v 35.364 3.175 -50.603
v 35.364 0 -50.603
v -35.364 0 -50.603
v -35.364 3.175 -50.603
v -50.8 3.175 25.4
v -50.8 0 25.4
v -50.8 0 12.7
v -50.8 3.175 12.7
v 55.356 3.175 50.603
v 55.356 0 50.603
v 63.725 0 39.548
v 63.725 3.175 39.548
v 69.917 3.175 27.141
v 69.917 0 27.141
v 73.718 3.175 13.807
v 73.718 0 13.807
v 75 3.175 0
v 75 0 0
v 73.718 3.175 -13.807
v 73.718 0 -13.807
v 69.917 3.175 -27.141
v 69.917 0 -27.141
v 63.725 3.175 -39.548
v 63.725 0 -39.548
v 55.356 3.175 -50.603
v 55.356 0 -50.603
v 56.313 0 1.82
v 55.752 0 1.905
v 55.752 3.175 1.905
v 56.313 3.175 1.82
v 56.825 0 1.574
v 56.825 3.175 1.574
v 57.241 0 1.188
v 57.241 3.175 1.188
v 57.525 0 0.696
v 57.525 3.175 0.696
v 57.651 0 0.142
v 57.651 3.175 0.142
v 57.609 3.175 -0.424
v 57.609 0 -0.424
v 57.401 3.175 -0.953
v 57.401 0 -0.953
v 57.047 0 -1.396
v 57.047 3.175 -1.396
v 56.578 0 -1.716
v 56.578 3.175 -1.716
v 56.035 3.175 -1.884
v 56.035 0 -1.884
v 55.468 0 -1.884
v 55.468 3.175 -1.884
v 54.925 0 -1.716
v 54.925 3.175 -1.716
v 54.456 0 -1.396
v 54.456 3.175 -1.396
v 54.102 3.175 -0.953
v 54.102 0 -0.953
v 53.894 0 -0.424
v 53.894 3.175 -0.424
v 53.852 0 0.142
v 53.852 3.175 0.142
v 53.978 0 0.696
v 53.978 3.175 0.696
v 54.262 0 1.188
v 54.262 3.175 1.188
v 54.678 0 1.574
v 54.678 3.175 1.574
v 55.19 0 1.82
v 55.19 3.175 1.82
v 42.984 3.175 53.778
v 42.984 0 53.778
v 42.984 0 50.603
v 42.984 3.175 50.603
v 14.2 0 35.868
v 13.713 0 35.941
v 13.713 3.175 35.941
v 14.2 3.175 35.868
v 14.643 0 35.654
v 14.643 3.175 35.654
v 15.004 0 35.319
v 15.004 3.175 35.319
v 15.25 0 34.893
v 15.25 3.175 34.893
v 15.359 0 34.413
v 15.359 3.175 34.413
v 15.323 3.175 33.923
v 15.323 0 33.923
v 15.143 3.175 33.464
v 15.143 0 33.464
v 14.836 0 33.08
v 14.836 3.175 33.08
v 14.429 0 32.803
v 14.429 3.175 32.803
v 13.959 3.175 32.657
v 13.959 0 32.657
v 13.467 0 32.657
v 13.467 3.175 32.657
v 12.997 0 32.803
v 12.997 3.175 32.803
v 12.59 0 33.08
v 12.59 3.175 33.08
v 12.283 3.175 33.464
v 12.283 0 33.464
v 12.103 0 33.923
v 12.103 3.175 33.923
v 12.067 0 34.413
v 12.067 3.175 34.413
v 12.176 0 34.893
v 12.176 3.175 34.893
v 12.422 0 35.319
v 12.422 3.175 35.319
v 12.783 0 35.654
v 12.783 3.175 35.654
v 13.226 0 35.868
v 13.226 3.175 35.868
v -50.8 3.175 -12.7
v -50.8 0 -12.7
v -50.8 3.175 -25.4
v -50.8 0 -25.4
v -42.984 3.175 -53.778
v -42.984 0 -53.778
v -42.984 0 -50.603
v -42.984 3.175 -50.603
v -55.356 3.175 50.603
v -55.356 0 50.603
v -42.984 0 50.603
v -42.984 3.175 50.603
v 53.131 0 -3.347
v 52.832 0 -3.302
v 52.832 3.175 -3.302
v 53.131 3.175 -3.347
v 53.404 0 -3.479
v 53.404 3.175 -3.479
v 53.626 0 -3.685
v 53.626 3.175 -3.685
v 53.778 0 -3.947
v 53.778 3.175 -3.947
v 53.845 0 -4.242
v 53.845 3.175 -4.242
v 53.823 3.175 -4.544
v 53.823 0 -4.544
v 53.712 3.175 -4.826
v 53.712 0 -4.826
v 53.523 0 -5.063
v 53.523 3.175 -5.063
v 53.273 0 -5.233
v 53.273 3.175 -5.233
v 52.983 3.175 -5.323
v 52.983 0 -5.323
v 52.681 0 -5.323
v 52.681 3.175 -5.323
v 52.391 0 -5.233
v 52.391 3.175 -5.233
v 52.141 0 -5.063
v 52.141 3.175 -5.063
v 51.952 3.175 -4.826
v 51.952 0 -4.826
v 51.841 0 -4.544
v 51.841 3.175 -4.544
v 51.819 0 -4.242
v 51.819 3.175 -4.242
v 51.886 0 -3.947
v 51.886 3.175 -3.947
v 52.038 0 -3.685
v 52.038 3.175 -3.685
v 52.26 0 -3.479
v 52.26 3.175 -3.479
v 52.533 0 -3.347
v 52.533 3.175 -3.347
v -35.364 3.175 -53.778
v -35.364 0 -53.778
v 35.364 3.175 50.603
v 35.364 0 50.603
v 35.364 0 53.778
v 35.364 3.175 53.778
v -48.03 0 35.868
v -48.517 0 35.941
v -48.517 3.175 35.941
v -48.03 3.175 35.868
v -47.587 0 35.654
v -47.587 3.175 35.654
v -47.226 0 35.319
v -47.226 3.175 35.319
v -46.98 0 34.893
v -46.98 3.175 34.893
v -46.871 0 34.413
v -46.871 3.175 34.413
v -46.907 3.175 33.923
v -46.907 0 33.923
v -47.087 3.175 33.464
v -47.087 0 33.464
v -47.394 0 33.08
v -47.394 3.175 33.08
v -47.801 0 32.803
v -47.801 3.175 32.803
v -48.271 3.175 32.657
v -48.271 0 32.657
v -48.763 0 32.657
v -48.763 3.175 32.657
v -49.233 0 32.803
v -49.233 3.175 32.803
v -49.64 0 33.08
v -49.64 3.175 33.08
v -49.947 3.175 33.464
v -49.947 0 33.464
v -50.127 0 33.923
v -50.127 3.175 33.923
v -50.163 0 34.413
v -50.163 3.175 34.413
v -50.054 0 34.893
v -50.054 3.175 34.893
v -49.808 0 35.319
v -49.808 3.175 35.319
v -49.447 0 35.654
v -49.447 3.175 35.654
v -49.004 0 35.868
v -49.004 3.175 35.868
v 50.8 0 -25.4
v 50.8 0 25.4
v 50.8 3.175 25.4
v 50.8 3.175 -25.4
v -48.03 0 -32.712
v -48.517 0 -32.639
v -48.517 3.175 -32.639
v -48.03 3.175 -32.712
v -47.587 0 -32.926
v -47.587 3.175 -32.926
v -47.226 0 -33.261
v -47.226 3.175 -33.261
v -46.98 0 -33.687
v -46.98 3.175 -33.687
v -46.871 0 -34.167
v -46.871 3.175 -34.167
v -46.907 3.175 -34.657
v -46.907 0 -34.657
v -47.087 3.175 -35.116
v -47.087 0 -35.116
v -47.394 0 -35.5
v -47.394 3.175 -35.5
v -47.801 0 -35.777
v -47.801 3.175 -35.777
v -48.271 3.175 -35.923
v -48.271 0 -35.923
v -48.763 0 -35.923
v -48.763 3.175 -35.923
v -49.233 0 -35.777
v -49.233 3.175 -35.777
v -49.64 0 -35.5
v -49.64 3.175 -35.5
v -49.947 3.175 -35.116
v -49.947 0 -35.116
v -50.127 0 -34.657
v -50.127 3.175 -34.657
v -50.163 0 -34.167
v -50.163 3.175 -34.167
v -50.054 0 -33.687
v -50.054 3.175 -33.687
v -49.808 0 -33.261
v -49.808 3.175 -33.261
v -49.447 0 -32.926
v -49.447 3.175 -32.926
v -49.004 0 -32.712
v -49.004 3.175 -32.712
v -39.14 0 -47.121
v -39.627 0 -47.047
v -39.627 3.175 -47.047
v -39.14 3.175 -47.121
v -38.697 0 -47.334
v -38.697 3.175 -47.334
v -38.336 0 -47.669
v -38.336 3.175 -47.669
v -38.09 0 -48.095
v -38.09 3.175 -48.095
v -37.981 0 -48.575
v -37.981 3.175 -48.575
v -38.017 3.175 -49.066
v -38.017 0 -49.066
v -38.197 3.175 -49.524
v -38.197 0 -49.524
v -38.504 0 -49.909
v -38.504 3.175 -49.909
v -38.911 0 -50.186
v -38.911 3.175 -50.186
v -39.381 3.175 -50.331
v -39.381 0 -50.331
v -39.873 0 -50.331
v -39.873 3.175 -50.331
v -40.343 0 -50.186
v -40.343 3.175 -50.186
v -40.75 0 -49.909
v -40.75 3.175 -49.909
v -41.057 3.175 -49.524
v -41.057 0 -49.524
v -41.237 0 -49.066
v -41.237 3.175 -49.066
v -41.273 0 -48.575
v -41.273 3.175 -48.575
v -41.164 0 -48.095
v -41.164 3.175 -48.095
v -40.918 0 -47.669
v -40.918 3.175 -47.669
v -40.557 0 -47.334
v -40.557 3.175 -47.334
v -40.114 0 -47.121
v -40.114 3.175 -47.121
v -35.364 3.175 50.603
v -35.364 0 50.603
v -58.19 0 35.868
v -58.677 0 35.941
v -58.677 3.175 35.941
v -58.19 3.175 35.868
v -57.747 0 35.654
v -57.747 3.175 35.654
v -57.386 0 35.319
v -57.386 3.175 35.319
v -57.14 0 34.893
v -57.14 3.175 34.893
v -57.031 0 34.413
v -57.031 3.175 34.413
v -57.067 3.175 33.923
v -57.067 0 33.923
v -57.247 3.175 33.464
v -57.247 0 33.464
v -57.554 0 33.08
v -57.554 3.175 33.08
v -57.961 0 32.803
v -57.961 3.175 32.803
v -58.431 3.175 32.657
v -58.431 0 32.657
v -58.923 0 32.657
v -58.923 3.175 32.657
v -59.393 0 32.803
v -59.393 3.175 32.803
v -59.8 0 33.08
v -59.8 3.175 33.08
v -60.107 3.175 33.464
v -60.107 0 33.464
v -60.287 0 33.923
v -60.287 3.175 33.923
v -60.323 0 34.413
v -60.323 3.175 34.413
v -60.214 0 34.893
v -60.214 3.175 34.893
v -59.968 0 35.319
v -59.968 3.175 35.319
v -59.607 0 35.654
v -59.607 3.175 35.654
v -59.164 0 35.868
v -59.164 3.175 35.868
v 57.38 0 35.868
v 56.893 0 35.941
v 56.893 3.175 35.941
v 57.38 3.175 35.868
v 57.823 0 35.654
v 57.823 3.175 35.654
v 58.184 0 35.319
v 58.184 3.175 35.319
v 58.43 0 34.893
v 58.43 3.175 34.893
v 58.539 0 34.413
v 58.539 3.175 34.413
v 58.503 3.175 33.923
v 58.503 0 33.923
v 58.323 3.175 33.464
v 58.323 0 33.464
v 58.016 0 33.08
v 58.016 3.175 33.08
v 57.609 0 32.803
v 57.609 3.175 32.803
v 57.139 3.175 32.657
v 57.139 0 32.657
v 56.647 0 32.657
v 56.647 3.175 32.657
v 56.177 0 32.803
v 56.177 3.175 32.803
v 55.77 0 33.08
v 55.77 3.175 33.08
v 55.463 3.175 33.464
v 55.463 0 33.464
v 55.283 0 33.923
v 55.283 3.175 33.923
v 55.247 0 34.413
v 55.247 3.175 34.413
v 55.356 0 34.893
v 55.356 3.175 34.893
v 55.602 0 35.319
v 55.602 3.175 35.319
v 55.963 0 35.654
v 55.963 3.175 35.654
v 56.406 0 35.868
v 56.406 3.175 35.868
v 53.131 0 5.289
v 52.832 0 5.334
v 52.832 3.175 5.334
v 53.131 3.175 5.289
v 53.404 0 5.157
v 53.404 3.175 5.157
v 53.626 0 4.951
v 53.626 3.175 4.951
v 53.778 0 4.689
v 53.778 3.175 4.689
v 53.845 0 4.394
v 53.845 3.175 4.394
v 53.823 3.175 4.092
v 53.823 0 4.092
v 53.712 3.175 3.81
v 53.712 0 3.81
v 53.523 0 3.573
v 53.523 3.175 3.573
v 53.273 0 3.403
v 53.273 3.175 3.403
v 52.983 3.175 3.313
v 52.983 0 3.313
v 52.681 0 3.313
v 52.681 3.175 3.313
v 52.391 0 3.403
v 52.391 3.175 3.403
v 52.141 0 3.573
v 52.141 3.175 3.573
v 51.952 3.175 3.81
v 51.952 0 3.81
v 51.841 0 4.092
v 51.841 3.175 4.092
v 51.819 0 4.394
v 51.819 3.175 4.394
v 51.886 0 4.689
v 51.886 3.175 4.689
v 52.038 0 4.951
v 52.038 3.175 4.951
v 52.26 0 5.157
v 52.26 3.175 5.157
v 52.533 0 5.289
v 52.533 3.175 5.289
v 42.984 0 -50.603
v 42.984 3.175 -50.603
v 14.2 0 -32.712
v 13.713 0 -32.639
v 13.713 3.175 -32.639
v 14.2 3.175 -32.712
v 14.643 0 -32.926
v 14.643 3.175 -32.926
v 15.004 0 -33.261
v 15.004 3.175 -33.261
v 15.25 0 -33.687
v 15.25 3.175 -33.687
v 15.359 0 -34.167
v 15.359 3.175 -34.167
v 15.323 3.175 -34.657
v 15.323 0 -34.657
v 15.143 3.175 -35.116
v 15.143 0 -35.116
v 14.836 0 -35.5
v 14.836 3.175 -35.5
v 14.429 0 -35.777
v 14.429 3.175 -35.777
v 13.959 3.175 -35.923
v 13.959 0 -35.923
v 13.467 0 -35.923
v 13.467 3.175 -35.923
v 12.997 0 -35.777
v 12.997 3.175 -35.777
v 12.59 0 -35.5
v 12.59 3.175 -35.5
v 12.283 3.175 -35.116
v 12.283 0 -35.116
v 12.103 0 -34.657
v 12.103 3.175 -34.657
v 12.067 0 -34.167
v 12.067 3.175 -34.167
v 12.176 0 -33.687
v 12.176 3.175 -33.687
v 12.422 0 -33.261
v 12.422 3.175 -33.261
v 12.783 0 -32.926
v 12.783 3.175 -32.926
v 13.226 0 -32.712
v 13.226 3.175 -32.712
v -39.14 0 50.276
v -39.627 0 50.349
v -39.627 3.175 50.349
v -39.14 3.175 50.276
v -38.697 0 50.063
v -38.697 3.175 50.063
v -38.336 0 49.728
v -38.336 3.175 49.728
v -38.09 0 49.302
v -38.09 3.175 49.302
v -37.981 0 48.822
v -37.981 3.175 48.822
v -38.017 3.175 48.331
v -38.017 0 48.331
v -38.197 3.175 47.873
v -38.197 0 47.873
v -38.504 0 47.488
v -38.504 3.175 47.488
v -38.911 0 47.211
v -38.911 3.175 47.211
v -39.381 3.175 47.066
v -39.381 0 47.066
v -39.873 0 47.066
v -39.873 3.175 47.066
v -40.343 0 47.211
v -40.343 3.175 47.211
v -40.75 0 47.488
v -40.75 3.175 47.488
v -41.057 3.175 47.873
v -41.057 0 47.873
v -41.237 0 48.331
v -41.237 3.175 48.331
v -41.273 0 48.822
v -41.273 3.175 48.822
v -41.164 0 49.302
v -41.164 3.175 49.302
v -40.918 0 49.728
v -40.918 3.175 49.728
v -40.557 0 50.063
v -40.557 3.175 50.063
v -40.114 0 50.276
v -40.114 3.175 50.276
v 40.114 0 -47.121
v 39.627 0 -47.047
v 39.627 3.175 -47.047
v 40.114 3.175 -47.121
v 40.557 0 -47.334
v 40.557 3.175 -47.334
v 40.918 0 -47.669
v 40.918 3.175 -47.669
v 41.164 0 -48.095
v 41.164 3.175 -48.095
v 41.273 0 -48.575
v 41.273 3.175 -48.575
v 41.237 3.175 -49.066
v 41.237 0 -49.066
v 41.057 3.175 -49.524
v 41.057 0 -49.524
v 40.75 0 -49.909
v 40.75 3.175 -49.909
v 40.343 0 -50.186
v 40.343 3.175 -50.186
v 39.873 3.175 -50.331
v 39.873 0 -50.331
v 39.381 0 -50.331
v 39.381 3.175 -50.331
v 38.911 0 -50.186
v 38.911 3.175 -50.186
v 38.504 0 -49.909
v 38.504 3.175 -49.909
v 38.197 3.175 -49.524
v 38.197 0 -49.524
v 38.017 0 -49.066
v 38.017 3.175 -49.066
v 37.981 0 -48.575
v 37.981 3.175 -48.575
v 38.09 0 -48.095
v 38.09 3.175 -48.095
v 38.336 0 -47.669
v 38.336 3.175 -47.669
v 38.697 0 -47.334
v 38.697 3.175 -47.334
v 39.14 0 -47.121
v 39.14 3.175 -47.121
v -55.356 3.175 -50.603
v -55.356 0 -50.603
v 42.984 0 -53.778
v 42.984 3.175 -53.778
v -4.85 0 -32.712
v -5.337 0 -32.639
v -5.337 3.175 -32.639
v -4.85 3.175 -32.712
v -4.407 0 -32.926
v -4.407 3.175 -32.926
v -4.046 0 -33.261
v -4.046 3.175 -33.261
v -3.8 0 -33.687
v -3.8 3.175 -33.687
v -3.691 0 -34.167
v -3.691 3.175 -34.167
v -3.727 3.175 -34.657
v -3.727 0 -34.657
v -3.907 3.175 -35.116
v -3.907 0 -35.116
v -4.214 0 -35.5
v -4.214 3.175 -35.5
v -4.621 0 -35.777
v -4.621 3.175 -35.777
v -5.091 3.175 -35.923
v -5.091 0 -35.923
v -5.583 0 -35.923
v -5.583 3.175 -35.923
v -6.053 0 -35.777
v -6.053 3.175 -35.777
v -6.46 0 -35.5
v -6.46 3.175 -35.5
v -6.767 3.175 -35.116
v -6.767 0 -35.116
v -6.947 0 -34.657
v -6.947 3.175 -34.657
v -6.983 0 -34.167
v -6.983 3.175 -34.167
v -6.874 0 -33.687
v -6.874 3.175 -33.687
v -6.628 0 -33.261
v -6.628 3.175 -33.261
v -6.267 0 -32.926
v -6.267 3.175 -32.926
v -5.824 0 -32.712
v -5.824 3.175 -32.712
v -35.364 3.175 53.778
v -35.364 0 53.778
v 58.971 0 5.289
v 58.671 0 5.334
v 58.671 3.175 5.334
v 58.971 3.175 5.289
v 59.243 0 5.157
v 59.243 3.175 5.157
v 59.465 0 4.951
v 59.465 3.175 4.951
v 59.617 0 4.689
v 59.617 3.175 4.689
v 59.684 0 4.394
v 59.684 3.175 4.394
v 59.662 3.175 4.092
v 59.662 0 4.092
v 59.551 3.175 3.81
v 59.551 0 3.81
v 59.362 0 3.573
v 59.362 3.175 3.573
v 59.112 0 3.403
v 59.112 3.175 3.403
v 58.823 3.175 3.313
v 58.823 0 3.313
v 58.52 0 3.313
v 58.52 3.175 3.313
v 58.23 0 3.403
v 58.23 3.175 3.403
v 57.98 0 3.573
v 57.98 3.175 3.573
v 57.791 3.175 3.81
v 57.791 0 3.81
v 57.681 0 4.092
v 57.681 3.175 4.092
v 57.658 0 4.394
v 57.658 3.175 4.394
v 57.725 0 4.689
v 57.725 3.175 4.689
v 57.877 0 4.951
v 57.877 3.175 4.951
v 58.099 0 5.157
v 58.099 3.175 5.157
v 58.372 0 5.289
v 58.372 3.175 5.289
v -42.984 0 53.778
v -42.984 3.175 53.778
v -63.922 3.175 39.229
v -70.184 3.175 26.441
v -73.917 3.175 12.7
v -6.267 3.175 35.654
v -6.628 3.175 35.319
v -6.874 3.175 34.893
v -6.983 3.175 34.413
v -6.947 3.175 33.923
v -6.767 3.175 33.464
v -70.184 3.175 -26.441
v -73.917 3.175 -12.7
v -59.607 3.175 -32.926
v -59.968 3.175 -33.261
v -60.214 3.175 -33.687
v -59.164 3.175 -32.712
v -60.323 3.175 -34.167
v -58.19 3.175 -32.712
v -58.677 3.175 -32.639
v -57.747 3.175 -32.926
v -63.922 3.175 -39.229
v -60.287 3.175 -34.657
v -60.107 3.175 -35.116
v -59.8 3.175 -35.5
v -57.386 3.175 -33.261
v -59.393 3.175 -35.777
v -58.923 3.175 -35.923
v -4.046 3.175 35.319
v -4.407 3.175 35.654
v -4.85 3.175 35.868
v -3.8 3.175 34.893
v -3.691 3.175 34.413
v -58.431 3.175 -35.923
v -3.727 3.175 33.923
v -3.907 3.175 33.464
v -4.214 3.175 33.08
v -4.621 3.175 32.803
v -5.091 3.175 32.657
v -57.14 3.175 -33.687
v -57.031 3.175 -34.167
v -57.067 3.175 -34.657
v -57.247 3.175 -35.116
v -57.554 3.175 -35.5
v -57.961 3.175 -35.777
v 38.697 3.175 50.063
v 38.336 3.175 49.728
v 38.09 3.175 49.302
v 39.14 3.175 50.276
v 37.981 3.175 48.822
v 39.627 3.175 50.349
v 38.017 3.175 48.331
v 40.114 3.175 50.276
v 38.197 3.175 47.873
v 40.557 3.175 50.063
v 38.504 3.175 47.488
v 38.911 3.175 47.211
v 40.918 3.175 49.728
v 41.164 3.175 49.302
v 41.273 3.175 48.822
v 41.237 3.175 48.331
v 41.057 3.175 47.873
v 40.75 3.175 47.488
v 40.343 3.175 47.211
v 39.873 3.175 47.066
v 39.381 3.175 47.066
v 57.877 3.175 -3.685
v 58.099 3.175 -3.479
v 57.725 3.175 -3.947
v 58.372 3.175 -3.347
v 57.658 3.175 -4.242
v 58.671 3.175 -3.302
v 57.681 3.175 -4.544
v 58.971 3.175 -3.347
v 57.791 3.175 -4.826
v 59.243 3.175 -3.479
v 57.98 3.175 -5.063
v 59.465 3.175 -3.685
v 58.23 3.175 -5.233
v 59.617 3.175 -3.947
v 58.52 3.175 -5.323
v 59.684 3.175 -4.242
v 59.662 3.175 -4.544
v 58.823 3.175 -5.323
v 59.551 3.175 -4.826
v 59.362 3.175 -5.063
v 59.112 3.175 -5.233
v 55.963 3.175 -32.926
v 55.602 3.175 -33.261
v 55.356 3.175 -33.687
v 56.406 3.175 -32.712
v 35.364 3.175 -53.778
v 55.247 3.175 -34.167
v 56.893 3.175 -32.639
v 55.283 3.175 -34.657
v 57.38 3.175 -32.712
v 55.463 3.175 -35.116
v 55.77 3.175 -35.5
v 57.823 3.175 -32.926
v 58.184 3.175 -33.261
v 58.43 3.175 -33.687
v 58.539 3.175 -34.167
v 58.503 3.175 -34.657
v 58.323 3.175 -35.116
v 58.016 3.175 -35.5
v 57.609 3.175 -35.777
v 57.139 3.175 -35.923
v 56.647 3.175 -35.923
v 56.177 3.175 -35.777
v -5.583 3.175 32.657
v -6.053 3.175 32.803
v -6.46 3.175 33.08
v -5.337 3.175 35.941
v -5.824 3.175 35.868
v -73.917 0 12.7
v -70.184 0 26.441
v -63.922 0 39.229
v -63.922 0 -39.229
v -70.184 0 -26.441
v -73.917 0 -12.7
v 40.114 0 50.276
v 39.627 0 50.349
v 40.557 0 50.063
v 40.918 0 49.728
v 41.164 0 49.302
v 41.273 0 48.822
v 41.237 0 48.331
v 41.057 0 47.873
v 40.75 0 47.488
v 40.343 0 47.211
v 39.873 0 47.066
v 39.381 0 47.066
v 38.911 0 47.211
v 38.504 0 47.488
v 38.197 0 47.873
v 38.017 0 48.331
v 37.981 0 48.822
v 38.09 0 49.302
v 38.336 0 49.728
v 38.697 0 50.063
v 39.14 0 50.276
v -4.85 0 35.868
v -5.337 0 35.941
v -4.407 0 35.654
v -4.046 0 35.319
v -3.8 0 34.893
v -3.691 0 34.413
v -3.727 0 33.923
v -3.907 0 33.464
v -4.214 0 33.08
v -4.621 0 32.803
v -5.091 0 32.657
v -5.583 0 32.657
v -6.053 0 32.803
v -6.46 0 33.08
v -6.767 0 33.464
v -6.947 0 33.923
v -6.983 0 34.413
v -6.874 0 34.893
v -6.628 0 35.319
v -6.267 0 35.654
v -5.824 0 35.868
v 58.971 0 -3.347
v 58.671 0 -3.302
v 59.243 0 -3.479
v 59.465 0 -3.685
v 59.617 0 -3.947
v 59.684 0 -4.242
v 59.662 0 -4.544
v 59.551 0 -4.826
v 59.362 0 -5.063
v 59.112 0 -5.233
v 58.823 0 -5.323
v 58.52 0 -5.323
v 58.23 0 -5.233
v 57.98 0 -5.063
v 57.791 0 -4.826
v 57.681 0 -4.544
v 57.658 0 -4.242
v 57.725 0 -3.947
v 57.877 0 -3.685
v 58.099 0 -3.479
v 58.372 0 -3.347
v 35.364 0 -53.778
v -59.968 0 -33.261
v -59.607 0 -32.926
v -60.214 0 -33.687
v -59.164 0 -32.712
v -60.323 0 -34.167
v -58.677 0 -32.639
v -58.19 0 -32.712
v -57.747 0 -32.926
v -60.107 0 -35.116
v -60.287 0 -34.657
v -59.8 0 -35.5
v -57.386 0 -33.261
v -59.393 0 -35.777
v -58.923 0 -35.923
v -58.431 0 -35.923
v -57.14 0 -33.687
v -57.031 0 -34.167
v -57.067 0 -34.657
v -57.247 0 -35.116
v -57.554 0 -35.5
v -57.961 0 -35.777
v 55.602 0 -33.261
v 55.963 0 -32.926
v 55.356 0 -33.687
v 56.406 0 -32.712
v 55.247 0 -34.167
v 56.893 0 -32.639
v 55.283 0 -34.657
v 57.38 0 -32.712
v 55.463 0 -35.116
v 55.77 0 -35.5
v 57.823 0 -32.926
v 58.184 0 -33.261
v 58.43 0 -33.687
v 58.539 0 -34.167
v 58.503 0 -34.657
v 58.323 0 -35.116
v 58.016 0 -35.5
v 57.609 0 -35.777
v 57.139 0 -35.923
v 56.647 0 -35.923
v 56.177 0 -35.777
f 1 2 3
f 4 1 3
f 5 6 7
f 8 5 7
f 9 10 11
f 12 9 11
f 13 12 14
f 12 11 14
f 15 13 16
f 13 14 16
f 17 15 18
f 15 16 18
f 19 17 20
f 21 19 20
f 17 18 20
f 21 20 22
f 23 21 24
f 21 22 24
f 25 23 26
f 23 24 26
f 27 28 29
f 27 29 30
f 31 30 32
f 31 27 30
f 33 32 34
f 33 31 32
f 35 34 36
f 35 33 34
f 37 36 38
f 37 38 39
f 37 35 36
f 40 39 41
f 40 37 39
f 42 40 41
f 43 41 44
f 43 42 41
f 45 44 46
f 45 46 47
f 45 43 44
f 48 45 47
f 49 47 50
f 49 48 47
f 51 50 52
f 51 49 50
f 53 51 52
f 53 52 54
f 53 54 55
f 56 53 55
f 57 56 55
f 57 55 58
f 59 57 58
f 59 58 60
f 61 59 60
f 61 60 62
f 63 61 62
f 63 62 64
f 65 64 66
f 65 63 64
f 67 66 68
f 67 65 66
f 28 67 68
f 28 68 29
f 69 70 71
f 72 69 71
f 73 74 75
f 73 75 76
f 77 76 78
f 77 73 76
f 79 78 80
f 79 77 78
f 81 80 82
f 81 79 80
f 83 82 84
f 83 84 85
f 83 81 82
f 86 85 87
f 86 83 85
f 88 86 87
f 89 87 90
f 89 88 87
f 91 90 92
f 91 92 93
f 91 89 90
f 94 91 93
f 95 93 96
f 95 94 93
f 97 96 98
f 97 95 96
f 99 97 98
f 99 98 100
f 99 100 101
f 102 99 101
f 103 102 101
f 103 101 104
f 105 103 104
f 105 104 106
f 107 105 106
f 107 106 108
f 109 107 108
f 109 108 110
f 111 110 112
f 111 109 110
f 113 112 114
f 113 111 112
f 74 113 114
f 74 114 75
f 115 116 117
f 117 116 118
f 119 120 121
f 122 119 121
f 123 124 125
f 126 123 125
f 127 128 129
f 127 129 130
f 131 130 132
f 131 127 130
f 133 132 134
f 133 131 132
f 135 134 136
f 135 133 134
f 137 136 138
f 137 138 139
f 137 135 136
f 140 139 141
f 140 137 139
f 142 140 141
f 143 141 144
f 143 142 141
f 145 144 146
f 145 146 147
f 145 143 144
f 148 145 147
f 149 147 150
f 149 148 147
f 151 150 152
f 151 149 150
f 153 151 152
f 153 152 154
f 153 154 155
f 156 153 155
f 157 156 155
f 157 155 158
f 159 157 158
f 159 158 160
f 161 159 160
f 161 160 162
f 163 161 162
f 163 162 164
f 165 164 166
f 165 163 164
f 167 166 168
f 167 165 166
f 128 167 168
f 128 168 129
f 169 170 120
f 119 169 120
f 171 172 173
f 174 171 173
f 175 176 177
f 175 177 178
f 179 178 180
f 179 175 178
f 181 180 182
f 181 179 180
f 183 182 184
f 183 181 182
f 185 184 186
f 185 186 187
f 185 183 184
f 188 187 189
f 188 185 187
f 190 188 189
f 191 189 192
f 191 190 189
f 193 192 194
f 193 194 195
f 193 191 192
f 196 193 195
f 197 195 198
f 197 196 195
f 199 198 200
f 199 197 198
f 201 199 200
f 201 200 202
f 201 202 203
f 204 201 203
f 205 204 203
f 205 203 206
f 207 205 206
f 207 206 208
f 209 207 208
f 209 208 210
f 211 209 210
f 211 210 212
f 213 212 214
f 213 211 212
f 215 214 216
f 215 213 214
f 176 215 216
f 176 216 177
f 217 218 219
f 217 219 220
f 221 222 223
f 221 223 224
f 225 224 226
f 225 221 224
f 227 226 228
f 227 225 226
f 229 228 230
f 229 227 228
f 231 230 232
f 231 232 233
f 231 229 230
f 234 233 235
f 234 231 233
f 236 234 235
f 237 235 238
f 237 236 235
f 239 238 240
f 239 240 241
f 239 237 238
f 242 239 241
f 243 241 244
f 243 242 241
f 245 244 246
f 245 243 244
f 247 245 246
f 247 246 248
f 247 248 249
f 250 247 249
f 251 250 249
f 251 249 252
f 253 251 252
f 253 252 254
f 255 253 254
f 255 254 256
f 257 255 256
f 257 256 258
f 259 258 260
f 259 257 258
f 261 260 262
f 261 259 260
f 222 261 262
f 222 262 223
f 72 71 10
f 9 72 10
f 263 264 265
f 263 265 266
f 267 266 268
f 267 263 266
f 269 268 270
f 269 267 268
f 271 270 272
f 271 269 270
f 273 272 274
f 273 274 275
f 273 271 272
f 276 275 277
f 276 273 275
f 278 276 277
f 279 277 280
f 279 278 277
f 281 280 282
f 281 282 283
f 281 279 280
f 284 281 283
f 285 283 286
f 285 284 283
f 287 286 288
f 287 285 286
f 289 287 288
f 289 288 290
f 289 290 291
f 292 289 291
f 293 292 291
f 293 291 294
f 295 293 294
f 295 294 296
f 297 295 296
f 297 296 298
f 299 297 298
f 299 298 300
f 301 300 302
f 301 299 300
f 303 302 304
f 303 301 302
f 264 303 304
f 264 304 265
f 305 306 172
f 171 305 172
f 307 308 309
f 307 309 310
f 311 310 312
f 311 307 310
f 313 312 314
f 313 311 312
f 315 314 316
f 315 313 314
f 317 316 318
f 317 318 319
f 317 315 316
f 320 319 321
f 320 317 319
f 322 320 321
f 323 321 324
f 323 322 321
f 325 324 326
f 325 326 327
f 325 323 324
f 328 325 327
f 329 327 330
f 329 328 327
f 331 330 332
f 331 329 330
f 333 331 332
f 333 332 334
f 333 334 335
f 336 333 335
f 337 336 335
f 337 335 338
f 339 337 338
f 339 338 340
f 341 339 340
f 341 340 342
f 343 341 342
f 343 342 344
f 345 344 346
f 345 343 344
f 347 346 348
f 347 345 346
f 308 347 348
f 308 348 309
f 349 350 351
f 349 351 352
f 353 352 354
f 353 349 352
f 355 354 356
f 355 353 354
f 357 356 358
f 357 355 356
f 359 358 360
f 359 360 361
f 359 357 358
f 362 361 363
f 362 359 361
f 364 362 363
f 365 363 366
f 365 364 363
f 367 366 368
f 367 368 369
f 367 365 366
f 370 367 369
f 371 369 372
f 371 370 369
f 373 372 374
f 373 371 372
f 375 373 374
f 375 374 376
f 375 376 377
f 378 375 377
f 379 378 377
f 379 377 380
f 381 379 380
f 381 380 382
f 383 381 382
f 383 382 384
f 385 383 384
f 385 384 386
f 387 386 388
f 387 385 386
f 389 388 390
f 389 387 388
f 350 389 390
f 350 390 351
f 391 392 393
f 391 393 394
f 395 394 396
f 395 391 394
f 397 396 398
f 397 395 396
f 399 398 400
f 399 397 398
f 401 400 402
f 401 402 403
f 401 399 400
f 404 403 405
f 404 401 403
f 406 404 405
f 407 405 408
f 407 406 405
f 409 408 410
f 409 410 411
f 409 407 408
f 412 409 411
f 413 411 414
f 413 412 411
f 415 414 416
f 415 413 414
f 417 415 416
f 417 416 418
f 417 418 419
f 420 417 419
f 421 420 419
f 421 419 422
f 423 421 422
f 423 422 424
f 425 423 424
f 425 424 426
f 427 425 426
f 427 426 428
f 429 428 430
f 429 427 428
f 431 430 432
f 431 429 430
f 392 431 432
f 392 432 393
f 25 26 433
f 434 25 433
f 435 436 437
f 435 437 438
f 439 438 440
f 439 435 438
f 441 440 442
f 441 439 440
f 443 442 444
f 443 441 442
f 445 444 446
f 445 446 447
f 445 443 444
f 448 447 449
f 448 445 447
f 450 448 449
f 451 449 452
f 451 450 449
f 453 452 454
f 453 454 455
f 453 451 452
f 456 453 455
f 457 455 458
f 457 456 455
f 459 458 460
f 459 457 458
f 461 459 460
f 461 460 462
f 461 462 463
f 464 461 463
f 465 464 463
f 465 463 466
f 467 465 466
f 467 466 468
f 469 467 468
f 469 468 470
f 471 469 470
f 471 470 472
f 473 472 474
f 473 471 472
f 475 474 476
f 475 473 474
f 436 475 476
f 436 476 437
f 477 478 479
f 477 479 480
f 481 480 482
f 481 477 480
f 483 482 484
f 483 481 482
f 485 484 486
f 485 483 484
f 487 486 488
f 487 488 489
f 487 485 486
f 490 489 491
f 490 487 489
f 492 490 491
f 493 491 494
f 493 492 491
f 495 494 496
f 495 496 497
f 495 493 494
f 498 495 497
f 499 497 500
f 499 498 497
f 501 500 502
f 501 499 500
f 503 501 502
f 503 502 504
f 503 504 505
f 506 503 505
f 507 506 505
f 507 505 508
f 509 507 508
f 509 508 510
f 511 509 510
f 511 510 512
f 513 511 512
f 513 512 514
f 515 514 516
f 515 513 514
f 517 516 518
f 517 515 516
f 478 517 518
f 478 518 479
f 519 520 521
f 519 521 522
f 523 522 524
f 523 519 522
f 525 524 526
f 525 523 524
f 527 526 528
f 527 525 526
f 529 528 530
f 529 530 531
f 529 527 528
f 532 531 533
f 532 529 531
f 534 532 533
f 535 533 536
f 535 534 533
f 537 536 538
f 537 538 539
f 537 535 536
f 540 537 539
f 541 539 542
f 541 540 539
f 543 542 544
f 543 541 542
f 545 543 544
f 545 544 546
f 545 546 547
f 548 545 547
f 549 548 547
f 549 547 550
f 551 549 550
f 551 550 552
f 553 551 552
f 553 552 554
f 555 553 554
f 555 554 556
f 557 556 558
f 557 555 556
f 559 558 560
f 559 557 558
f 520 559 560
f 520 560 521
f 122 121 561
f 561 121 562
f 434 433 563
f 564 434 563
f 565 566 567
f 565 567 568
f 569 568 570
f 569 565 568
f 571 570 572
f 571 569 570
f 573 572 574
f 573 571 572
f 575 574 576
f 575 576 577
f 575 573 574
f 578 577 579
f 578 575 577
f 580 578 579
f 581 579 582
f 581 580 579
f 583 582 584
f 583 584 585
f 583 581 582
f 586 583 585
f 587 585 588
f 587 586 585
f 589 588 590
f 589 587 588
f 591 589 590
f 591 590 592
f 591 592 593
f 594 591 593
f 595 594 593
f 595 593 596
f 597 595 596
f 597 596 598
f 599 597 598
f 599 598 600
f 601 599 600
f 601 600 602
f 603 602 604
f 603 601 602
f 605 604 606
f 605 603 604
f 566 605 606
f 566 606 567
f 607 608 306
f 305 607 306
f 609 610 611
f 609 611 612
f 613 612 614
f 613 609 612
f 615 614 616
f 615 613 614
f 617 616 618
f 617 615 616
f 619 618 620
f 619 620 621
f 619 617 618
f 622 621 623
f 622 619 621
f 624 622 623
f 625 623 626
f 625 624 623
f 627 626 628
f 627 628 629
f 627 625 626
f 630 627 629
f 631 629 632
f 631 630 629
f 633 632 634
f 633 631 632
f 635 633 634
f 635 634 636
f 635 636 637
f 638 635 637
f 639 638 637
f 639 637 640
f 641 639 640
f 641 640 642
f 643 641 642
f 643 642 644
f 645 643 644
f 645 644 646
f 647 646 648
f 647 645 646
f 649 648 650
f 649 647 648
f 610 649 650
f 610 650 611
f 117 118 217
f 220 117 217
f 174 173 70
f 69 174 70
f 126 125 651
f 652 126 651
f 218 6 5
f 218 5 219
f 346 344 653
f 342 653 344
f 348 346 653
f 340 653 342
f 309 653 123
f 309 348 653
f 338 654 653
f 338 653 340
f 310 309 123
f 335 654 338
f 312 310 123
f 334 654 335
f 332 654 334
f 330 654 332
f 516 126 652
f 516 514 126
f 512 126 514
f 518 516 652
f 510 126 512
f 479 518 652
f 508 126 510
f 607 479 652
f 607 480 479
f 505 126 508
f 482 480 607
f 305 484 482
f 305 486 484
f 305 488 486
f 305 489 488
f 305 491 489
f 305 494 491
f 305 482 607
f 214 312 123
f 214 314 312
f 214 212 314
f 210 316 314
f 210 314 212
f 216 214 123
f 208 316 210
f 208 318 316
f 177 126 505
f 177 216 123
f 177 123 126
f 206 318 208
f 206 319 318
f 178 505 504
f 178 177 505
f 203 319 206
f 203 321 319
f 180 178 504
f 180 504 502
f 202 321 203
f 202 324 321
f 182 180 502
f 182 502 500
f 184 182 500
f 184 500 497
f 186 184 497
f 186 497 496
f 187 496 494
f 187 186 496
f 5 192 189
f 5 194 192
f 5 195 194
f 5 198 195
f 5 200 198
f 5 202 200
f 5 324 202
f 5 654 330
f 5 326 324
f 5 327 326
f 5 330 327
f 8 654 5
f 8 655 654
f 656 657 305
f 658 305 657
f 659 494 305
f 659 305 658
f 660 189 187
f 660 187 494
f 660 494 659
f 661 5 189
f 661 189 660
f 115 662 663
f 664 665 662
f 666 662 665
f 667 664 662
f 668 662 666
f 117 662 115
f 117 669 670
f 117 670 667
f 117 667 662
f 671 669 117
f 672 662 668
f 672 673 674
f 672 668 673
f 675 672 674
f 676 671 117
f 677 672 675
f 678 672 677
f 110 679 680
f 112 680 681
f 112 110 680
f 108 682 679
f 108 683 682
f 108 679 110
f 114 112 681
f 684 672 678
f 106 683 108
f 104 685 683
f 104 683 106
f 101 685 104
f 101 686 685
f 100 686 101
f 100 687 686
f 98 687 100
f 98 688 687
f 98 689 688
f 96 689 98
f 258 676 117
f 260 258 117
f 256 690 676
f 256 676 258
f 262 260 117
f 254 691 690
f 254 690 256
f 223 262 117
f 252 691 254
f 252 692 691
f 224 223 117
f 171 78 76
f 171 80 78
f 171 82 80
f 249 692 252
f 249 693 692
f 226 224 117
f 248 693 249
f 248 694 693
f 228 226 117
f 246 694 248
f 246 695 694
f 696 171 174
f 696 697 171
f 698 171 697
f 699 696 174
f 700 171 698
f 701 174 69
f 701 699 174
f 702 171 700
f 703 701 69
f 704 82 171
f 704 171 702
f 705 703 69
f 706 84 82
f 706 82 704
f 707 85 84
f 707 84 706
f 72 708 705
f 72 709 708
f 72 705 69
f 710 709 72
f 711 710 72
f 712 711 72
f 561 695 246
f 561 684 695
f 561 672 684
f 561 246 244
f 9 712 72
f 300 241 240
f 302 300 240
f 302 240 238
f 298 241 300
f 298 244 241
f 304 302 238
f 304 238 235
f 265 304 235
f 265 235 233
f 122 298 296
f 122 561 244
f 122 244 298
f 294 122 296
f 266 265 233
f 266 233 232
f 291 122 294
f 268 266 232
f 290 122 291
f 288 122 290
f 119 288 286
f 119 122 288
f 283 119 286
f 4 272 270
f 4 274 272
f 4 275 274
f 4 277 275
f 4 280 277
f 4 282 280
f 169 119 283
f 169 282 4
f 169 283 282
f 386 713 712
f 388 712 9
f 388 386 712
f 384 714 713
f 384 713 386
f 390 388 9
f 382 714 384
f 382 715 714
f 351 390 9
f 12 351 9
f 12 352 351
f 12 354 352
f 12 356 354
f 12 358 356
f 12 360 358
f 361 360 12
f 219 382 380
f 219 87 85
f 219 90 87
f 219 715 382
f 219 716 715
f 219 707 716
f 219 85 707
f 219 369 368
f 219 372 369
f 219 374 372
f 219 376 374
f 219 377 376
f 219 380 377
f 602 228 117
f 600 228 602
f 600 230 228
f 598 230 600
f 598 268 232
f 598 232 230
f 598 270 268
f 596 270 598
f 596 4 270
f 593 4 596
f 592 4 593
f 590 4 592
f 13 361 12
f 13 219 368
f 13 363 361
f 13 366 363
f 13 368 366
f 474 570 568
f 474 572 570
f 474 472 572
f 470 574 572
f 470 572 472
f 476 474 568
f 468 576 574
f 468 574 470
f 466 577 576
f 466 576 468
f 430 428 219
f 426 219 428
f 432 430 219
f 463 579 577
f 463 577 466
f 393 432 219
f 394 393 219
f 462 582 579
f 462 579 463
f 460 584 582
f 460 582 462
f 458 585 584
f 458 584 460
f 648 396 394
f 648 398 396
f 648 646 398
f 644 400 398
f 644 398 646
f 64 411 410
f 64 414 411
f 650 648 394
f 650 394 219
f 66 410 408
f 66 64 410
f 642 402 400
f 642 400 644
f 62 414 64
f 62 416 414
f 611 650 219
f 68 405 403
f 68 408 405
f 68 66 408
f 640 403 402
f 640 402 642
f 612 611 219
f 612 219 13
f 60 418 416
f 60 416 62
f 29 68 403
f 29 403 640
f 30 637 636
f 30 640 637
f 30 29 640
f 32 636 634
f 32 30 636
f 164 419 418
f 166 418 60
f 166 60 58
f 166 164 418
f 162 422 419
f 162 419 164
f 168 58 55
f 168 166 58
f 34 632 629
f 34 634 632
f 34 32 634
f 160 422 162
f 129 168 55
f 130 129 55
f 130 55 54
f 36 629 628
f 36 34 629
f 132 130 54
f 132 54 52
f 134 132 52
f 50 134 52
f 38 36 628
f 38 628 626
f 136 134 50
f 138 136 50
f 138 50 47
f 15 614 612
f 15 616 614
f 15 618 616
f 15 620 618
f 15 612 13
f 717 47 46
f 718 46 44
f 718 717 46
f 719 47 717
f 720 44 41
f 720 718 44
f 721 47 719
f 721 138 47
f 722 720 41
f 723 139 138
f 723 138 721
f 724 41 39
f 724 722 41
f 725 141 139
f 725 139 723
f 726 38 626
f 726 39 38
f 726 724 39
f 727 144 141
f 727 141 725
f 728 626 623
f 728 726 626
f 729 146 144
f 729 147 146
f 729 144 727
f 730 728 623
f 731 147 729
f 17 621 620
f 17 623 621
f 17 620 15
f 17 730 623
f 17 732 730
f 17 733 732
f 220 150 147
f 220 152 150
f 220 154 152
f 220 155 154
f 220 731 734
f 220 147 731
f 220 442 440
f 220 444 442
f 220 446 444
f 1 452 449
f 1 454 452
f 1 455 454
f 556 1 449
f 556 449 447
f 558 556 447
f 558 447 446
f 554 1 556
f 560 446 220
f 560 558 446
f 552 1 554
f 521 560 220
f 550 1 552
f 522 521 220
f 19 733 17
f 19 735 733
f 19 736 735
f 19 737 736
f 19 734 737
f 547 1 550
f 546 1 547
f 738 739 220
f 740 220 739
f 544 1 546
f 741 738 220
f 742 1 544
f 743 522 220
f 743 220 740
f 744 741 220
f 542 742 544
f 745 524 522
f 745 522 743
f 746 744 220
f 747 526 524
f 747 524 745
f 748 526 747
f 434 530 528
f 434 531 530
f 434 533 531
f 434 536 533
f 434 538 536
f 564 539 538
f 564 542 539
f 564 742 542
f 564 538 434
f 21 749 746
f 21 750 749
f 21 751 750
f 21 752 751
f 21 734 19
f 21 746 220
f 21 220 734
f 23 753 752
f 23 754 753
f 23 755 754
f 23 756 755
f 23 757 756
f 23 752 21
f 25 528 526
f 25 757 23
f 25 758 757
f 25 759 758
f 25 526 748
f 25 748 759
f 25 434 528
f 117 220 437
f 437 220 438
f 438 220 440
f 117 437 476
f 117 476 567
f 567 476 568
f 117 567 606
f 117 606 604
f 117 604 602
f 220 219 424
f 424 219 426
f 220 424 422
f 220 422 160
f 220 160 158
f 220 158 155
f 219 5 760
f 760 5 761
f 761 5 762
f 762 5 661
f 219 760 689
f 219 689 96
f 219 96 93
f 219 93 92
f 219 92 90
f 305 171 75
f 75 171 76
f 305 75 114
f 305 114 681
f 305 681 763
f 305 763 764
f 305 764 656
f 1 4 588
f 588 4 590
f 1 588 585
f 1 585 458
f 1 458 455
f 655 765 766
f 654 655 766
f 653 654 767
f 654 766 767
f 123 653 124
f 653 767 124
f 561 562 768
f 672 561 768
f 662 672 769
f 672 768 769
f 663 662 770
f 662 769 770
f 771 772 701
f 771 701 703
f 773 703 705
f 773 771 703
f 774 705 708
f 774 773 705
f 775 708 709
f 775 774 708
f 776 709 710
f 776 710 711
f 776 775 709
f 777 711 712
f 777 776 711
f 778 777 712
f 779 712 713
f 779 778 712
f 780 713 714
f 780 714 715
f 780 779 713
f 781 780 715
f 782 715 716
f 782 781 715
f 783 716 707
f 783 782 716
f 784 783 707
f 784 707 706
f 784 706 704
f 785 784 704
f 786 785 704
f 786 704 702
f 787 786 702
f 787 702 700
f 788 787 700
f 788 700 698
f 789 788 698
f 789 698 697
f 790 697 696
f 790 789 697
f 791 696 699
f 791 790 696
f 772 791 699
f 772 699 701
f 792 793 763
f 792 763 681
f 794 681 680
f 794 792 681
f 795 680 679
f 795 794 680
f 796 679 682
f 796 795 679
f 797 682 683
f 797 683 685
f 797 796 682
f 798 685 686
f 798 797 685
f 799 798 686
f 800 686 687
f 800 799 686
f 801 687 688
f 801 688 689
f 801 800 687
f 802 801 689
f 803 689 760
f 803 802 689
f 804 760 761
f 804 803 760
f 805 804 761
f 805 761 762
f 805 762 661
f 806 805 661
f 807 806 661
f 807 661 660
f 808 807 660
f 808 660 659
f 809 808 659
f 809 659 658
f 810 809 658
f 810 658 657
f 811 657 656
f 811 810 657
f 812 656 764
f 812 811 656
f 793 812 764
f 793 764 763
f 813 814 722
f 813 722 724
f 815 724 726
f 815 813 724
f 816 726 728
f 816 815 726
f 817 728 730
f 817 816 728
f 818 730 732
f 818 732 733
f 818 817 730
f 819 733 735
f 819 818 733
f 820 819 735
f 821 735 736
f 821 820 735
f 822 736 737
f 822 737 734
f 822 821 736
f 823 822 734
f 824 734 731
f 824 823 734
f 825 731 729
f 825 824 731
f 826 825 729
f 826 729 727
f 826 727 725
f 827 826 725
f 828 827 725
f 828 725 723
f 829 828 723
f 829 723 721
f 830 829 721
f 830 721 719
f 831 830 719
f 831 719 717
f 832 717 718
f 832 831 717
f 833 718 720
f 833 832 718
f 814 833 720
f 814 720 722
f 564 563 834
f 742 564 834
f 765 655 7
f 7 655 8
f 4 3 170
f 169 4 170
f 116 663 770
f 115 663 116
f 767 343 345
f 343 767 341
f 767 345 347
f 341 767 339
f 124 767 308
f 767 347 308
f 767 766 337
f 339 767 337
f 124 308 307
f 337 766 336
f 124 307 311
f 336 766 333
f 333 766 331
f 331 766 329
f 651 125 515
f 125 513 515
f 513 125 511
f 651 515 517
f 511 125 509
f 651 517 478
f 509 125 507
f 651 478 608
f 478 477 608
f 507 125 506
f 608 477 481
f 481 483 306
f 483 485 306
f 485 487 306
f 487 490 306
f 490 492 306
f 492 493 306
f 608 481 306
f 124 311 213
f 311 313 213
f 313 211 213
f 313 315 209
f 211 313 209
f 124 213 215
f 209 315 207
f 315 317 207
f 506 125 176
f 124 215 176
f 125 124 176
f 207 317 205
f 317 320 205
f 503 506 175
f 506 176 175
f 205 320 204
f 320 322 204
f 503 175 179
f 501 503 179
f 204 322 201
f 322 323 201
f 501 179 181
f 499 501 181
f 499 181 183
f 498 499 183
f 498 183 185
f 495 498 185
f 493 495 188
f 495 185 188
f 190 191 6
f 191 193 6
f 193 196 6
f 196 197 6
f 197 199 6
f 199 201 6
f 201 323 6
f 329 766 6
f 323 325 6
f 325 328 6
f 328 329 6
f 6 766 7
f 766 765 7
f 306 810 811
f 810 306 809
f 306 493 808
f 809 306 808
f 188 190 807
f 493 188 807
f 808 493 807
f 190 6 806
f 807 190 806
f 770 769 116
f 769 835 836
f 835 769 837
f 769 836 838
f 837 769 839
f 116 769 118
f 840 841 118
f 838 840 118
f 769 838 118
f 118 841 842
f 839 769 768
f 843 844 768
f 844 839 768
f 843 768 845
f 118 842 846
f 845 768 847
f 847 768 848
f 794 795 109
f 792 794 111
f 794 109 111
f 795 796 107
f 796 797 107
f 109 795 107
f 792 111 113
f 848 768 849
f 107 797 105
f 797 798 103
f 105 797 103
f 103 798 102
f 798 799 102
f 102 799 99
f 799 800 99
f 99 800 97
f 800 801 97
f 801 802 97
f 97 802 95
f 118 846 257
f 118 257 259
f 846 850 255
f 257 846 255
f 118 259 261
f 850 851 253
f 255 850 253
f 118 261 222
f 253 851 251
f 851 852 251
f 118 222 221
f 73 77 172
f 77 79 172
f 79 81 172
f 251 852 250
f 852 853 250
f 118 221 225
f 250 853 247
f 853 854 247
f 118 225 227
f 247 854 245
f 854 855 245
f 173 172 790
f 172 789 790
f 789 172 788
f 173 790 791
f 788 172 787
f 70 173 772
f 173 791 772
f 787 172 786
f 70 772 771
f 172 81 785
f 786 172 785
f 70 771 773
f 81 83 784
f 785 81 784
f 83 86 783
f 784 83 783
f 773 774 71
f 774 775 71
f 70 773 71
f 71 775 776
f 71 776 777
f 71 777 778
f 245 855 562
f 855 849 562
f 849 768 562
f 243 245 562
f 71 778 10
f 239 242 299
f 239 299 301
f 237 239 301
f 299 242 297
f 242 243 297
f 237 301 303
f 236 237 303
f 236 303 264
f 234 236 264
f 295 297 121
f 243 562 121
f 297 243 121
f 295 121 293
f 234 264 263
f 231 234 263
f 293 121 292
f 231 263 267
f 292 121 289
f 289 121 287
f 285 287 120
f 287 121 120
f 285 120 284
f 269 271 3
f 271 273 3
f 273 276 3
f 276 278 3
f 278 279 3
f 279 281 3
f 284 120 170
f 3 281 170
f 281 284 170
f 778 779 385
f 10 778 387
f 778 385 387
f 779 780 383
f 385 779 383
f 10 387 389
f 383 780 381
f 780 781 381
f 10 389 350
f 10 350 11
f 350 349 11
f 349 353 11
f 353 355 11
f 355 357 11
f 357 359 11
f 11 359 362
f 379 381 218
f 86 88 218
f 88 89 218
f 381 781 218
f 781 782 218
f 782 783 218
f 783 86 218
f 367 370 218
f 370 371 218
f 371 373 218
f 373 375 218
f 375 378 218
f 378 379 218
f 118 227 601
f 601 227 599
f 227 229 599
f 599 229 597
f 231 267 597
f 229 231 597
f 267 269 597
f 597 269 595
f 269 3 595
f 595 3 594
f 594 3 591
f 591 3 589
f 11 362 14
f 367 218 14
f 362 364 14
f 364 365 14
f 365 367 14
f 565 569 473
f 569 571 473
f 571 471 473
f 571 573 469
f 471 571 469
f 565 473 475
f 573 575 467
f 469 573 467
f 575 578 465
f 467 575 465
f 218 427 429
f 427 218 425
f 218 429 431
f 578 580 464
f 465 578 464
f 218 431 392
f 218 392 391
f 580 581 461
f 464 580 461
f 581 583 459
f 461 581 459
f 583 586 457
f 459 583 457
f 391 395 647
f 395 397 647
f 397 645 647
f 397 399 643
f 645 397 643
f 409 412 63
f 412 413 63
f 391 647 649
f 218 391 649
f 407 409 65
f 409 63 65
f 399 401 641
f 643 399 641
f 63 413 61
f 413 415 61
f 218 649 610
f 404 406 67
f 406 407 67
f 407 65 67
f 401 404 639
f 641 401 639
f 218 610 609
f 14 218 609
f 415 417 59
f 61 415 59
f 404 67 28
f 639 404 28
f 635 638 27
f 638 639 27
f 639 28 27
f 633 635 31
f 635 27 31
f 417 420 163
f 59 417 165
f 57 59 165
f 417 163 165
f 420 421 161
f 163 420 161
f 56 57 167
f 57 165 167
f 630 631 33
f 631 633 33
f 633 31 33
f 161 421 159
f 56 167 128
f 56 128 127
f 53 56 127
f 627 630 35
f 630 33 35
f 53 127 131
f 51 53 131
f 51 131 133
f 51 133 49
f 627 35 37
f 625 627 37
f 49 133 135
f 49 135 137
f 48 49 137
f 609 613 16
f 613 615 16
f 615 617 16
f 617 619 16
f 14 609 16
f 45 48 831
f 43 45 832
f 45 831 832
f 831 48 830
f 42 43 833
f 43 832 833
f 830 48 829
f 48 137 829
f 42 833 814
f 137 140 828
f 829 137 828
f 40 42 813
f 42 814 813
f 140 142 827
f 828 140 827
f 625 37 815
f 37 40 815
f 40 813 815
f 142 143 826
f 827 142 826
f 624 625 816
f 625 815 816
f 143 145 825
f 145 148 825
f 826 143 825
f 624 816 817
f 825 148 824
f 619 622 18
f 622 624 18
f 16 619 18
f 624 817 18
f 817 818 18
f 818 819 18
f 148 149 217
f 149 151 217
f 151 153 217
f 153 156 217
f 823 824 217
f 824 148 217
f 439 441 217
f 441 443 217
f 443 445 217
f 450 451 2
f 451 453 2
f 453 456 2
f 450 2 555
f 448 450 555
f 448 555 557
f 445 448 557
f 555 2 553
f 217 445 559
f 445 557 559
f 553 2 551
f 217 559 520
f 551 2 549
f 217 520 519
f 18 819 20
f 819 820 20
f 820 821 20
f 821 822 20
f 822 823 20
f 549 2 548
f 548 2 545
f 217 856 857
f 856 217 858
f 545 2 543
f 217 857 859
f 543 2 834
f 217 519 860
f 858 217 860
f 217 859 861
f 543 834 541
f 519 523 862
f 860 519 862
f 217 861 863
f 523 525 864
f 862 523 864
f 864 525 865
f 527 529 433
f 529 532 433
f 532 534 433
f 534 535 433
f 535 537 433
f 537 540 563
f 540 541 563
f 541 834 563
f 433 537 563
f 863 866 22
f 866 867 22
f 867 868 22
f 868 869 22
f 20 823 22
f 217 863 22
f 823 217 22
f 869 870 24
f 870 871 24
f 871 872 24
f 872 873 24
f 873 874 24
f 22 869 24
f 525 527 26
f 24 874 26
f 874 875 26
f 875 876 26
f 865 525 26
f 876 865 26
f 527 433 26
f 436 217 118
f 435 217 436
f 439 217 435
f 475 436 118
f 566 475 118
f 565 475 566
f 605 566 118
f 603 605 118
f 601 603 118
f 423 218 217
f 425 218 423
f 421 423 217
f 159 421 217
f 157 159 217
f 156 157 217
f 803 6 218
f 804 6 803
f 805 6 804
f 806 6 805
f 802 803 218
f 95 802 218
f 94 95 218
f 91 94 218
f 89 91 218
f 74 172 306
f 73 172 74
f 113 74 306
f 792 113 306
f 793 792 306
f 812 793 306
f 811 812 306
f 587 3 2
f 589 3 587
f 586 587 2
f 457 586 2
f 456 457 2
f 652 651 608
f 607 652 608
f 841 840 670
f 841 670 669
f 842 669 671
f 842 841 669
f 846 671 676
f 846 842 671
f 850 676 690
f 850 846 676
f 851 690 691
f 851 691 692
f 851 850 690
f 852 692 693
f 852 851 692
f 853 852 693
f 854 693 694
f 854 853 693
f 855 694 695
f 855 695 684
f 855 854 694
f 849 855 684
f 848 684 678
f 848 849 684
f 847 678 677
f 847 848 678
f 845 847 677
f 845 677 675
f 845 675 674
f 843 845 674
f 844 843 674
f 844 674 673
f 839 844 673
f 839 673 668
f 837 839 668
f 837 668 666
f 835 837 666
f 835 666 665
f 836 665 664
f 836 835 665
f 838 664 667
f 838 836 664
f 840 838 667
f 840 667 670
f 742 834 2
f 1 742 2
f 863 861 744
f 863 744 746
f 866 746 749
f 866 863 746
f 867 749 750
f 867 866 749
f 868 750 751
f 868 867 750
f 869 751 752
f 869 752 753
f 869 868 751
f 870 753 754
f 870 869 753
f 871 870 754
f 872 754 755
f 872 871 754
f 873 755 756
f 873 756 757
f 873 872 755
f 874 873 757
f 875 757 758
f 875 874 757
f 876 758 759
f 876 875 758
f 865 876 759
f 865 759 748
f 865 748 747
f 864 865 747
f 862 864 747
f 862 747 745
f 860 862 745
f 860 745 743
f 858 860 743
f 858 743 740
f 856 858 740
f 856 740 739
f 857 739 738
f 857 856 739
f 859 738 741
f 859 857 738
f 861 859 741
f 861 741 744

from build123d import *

# Parameters (mm, degrees)
SKETCH1_R           = 1.651
SKETCH1_R_2         = 1.905
SKETCH1_R_3         = 1.016
SKETCH1_W           = 101.6
SKETCH1_H           = 50.8
BOSS_EXTRUDE1_DEPTH = 3.175
SKETCH3_W           = 23.116912814
SKETCH3_H           = 25.4
CUT_EXTRUDE2_DEPTH  = 3.175


with BuildPart() as part:
    # Sketch1 → Boss-Extrude1 (new body)
    with BuildSketch(Plane(origin=(0, 0, 0), x_dir=(1, 0, 0), z_dir=(0, 1, 0))):
        with BuildLine():
            Line((-73.916912814, 12.7), (-73.916912814, -12.7))
            ThreePointArc((-73.916912814, -12.7), (-67.357563081, -32.984218889), (-55.35602635, -50.603461806))
            Line((-55.35602635, -50.603461806), (-42.984152136, -50.603461806))
            Line((-42.984152136, -50.603461806), (-42.984152136, -53.778461806))
            Line((-42.984152136, -53.778461806), (-35.364152136, -53.778461806))
            Line((-35.364152136, -53.778461806), (-35.364152136, -50.603461806))
            Line((-35.364152136, -50.603461806), (35.364152136, -50.603461806))
            Line((35.364152136, -50.603461806), (35.364152136, -53.778461806))
            Line((35.364152136, -53.778461806), (42.984152136, -53.778461806))
            Line((42.984152136, -53.778461806), (42.984152136, -50.603461806))
            Line((42.984152136, -50.603461806), (55.35602635, -50.603461806))
            ThreePointArc((55.35602635, -50.603461806), (75, 0), (55.35602635, 50.603461806))
            Line((55.35602635, 50.603461806), (42.984152136, 50.603461806))
            Line((42.984152136, 50.603461806), (42.984152136, 53.778461806))
            Line((42.984152136, 53.778461806), (35.364152136, 53.778461806))
            Line((35.364152136, 53.778461806), (35.364152136, 50.603461806))
            Line((35.364152136, 50.603461806), (-35.364152136, 50.603461806))
            Line((-35.364152136, 50.603461806), (-35.364152136, 53.778461806))
            Line((-35.364152136, 53.778461806), (-42.984152136, 53.778461806))
            Line((-42.984152136, 53.778461806), (-42.984152136, 50.603461806))
            Line((-42.984152136, 50.603461806), (-55.35602635, 50.603461806))
            ThreePointArc((-55.35602635, 50.603461806), (-67.357563081, 32.984218889), (-73.916912814, 12.7))
        make_face()
        with Locations(Location((13.713087186, 34.29, 0), (0, 0, 270))):
            Circle(SKETCH1_R, mode=Mode.SUBTRACT)
        with Locations(Location((-58.676912814, -34.29, 0), (0, 0, 270))):
            Circle(SKETCH1_R, mode=Mode.SUBTRACT)
        with Locations(Location((-58.676912814, 34.29, 0), (0, 0, 270))):
            Circle(SKETCH1_R, mode=Mode.SUBTRACT)
        with Locations(Location((-39.626912814, 48.698461806, 0), (0, 0, 270))):
            Circle(SKETCH1_R, mode=Mode.SUBTRACT)
        with Locations(Location((39.626912814, 48.698461806, 0), (0, 0, 270))):
            Circle(SKETCH1_R, mode=Mode.SUBTRACT)
        with Locations(Location((-39.626912814, -48.698461806, 0), (0, 0, 270))):
            Circle(SKETCH1_R, mode=Mode.SUBTRACT)
        with Locations(Location((39.626912814, -48.698461806, 0), (0, 0, 270))):
            Circle(SKETCH1_R, mode=Mode.SUBTRACT)
        with Locations(Location((56.893087186, 34.29, 0), (0, 0, 270))):
            Circle(SKETCH1_R, mode=Mode.SUBTRACT)
        with Locations(Location((-48.516912814, 34.29, 0), (0, 0, 270))):
            Circle(SKETCH1_R, mode=Mode.SUBTRACT)
        with Locations(Location((-5.336912814, 34.29, 0), (0, 0, 270))):
            Circle(SKETCH1_R, mode=Mode.SUBTRACT)
        with Locations(Location((-5.336912814, -34.29, 0), (0, 0, 270))):
            Circle(SKETCH1_R, mode=Mode.SUBTRACT)
        with Locations(Location((-48.516912814, -34.29, 0), (0, 0, 270))):
            Circle(SKETCH1_R, mode=Mode.SUBTRACT)
        with Locations(Location((13.713087186, -34.29, 0), (0, 0, 270))):
            Circle(SKETCH1_R, mode=Mode.SUBTRACT)
        with Locations(Location((56.893087186, -34.29, 0), (0, 0, 270))):
            Circle(SKETCH1_R, mode=Mode.SUBTRACT)
        with Locations(Location((55.751543593, 0, 0), (0, 0, 270))):
            Circle(SKETCH1_R_2, mode=Mode.SUBTRACT)
        with Locations(Location((58.671087186, 4.318, 0), (0, 0, 270))):
            Circle(SKETCH1_R_3, mode=Mode.SUBTRACT)
        with Locations(Location((58.671087186, -4.318, 0), (0, 0, 270))):
            Circle(SKETCH1_R_3, mode=Mode.SUBTRACT)
        with Locations(Location((52.832, -4.318, 0), (0, 0, 270))):
            Circle(SKETCH1_R_3, mode=Mode.SUBTRACT)
        with Locations(Location((52.832, 4.318, 0), (0, 0, 270))):
            Circle(SKETCH1_R_3, mode=Mode.SUBTRACT)
        Rectangle(SKETCH1_W, SKETCH1_H, mode=Mode.SUBTRACT)
    extrude(amount=BOSS_EXTRUDE1_DEPTH)

    # Sketch3 → Cut-Extrude2 (cut)
    with BuildSketch(Plane(origin=(0, 3.175, 0), x_dir=(1, 0, 0), z_dir=(0, 1, 0))):
        with Locations((-62.358456407, 0)):
            Rectangle(SKETCH3_W, SKETCH3_H)
    extrude(amount=-CUT_EXTRUDE2_DEPTH, mode=Mode.SUBTRACT)


solid = part.part
